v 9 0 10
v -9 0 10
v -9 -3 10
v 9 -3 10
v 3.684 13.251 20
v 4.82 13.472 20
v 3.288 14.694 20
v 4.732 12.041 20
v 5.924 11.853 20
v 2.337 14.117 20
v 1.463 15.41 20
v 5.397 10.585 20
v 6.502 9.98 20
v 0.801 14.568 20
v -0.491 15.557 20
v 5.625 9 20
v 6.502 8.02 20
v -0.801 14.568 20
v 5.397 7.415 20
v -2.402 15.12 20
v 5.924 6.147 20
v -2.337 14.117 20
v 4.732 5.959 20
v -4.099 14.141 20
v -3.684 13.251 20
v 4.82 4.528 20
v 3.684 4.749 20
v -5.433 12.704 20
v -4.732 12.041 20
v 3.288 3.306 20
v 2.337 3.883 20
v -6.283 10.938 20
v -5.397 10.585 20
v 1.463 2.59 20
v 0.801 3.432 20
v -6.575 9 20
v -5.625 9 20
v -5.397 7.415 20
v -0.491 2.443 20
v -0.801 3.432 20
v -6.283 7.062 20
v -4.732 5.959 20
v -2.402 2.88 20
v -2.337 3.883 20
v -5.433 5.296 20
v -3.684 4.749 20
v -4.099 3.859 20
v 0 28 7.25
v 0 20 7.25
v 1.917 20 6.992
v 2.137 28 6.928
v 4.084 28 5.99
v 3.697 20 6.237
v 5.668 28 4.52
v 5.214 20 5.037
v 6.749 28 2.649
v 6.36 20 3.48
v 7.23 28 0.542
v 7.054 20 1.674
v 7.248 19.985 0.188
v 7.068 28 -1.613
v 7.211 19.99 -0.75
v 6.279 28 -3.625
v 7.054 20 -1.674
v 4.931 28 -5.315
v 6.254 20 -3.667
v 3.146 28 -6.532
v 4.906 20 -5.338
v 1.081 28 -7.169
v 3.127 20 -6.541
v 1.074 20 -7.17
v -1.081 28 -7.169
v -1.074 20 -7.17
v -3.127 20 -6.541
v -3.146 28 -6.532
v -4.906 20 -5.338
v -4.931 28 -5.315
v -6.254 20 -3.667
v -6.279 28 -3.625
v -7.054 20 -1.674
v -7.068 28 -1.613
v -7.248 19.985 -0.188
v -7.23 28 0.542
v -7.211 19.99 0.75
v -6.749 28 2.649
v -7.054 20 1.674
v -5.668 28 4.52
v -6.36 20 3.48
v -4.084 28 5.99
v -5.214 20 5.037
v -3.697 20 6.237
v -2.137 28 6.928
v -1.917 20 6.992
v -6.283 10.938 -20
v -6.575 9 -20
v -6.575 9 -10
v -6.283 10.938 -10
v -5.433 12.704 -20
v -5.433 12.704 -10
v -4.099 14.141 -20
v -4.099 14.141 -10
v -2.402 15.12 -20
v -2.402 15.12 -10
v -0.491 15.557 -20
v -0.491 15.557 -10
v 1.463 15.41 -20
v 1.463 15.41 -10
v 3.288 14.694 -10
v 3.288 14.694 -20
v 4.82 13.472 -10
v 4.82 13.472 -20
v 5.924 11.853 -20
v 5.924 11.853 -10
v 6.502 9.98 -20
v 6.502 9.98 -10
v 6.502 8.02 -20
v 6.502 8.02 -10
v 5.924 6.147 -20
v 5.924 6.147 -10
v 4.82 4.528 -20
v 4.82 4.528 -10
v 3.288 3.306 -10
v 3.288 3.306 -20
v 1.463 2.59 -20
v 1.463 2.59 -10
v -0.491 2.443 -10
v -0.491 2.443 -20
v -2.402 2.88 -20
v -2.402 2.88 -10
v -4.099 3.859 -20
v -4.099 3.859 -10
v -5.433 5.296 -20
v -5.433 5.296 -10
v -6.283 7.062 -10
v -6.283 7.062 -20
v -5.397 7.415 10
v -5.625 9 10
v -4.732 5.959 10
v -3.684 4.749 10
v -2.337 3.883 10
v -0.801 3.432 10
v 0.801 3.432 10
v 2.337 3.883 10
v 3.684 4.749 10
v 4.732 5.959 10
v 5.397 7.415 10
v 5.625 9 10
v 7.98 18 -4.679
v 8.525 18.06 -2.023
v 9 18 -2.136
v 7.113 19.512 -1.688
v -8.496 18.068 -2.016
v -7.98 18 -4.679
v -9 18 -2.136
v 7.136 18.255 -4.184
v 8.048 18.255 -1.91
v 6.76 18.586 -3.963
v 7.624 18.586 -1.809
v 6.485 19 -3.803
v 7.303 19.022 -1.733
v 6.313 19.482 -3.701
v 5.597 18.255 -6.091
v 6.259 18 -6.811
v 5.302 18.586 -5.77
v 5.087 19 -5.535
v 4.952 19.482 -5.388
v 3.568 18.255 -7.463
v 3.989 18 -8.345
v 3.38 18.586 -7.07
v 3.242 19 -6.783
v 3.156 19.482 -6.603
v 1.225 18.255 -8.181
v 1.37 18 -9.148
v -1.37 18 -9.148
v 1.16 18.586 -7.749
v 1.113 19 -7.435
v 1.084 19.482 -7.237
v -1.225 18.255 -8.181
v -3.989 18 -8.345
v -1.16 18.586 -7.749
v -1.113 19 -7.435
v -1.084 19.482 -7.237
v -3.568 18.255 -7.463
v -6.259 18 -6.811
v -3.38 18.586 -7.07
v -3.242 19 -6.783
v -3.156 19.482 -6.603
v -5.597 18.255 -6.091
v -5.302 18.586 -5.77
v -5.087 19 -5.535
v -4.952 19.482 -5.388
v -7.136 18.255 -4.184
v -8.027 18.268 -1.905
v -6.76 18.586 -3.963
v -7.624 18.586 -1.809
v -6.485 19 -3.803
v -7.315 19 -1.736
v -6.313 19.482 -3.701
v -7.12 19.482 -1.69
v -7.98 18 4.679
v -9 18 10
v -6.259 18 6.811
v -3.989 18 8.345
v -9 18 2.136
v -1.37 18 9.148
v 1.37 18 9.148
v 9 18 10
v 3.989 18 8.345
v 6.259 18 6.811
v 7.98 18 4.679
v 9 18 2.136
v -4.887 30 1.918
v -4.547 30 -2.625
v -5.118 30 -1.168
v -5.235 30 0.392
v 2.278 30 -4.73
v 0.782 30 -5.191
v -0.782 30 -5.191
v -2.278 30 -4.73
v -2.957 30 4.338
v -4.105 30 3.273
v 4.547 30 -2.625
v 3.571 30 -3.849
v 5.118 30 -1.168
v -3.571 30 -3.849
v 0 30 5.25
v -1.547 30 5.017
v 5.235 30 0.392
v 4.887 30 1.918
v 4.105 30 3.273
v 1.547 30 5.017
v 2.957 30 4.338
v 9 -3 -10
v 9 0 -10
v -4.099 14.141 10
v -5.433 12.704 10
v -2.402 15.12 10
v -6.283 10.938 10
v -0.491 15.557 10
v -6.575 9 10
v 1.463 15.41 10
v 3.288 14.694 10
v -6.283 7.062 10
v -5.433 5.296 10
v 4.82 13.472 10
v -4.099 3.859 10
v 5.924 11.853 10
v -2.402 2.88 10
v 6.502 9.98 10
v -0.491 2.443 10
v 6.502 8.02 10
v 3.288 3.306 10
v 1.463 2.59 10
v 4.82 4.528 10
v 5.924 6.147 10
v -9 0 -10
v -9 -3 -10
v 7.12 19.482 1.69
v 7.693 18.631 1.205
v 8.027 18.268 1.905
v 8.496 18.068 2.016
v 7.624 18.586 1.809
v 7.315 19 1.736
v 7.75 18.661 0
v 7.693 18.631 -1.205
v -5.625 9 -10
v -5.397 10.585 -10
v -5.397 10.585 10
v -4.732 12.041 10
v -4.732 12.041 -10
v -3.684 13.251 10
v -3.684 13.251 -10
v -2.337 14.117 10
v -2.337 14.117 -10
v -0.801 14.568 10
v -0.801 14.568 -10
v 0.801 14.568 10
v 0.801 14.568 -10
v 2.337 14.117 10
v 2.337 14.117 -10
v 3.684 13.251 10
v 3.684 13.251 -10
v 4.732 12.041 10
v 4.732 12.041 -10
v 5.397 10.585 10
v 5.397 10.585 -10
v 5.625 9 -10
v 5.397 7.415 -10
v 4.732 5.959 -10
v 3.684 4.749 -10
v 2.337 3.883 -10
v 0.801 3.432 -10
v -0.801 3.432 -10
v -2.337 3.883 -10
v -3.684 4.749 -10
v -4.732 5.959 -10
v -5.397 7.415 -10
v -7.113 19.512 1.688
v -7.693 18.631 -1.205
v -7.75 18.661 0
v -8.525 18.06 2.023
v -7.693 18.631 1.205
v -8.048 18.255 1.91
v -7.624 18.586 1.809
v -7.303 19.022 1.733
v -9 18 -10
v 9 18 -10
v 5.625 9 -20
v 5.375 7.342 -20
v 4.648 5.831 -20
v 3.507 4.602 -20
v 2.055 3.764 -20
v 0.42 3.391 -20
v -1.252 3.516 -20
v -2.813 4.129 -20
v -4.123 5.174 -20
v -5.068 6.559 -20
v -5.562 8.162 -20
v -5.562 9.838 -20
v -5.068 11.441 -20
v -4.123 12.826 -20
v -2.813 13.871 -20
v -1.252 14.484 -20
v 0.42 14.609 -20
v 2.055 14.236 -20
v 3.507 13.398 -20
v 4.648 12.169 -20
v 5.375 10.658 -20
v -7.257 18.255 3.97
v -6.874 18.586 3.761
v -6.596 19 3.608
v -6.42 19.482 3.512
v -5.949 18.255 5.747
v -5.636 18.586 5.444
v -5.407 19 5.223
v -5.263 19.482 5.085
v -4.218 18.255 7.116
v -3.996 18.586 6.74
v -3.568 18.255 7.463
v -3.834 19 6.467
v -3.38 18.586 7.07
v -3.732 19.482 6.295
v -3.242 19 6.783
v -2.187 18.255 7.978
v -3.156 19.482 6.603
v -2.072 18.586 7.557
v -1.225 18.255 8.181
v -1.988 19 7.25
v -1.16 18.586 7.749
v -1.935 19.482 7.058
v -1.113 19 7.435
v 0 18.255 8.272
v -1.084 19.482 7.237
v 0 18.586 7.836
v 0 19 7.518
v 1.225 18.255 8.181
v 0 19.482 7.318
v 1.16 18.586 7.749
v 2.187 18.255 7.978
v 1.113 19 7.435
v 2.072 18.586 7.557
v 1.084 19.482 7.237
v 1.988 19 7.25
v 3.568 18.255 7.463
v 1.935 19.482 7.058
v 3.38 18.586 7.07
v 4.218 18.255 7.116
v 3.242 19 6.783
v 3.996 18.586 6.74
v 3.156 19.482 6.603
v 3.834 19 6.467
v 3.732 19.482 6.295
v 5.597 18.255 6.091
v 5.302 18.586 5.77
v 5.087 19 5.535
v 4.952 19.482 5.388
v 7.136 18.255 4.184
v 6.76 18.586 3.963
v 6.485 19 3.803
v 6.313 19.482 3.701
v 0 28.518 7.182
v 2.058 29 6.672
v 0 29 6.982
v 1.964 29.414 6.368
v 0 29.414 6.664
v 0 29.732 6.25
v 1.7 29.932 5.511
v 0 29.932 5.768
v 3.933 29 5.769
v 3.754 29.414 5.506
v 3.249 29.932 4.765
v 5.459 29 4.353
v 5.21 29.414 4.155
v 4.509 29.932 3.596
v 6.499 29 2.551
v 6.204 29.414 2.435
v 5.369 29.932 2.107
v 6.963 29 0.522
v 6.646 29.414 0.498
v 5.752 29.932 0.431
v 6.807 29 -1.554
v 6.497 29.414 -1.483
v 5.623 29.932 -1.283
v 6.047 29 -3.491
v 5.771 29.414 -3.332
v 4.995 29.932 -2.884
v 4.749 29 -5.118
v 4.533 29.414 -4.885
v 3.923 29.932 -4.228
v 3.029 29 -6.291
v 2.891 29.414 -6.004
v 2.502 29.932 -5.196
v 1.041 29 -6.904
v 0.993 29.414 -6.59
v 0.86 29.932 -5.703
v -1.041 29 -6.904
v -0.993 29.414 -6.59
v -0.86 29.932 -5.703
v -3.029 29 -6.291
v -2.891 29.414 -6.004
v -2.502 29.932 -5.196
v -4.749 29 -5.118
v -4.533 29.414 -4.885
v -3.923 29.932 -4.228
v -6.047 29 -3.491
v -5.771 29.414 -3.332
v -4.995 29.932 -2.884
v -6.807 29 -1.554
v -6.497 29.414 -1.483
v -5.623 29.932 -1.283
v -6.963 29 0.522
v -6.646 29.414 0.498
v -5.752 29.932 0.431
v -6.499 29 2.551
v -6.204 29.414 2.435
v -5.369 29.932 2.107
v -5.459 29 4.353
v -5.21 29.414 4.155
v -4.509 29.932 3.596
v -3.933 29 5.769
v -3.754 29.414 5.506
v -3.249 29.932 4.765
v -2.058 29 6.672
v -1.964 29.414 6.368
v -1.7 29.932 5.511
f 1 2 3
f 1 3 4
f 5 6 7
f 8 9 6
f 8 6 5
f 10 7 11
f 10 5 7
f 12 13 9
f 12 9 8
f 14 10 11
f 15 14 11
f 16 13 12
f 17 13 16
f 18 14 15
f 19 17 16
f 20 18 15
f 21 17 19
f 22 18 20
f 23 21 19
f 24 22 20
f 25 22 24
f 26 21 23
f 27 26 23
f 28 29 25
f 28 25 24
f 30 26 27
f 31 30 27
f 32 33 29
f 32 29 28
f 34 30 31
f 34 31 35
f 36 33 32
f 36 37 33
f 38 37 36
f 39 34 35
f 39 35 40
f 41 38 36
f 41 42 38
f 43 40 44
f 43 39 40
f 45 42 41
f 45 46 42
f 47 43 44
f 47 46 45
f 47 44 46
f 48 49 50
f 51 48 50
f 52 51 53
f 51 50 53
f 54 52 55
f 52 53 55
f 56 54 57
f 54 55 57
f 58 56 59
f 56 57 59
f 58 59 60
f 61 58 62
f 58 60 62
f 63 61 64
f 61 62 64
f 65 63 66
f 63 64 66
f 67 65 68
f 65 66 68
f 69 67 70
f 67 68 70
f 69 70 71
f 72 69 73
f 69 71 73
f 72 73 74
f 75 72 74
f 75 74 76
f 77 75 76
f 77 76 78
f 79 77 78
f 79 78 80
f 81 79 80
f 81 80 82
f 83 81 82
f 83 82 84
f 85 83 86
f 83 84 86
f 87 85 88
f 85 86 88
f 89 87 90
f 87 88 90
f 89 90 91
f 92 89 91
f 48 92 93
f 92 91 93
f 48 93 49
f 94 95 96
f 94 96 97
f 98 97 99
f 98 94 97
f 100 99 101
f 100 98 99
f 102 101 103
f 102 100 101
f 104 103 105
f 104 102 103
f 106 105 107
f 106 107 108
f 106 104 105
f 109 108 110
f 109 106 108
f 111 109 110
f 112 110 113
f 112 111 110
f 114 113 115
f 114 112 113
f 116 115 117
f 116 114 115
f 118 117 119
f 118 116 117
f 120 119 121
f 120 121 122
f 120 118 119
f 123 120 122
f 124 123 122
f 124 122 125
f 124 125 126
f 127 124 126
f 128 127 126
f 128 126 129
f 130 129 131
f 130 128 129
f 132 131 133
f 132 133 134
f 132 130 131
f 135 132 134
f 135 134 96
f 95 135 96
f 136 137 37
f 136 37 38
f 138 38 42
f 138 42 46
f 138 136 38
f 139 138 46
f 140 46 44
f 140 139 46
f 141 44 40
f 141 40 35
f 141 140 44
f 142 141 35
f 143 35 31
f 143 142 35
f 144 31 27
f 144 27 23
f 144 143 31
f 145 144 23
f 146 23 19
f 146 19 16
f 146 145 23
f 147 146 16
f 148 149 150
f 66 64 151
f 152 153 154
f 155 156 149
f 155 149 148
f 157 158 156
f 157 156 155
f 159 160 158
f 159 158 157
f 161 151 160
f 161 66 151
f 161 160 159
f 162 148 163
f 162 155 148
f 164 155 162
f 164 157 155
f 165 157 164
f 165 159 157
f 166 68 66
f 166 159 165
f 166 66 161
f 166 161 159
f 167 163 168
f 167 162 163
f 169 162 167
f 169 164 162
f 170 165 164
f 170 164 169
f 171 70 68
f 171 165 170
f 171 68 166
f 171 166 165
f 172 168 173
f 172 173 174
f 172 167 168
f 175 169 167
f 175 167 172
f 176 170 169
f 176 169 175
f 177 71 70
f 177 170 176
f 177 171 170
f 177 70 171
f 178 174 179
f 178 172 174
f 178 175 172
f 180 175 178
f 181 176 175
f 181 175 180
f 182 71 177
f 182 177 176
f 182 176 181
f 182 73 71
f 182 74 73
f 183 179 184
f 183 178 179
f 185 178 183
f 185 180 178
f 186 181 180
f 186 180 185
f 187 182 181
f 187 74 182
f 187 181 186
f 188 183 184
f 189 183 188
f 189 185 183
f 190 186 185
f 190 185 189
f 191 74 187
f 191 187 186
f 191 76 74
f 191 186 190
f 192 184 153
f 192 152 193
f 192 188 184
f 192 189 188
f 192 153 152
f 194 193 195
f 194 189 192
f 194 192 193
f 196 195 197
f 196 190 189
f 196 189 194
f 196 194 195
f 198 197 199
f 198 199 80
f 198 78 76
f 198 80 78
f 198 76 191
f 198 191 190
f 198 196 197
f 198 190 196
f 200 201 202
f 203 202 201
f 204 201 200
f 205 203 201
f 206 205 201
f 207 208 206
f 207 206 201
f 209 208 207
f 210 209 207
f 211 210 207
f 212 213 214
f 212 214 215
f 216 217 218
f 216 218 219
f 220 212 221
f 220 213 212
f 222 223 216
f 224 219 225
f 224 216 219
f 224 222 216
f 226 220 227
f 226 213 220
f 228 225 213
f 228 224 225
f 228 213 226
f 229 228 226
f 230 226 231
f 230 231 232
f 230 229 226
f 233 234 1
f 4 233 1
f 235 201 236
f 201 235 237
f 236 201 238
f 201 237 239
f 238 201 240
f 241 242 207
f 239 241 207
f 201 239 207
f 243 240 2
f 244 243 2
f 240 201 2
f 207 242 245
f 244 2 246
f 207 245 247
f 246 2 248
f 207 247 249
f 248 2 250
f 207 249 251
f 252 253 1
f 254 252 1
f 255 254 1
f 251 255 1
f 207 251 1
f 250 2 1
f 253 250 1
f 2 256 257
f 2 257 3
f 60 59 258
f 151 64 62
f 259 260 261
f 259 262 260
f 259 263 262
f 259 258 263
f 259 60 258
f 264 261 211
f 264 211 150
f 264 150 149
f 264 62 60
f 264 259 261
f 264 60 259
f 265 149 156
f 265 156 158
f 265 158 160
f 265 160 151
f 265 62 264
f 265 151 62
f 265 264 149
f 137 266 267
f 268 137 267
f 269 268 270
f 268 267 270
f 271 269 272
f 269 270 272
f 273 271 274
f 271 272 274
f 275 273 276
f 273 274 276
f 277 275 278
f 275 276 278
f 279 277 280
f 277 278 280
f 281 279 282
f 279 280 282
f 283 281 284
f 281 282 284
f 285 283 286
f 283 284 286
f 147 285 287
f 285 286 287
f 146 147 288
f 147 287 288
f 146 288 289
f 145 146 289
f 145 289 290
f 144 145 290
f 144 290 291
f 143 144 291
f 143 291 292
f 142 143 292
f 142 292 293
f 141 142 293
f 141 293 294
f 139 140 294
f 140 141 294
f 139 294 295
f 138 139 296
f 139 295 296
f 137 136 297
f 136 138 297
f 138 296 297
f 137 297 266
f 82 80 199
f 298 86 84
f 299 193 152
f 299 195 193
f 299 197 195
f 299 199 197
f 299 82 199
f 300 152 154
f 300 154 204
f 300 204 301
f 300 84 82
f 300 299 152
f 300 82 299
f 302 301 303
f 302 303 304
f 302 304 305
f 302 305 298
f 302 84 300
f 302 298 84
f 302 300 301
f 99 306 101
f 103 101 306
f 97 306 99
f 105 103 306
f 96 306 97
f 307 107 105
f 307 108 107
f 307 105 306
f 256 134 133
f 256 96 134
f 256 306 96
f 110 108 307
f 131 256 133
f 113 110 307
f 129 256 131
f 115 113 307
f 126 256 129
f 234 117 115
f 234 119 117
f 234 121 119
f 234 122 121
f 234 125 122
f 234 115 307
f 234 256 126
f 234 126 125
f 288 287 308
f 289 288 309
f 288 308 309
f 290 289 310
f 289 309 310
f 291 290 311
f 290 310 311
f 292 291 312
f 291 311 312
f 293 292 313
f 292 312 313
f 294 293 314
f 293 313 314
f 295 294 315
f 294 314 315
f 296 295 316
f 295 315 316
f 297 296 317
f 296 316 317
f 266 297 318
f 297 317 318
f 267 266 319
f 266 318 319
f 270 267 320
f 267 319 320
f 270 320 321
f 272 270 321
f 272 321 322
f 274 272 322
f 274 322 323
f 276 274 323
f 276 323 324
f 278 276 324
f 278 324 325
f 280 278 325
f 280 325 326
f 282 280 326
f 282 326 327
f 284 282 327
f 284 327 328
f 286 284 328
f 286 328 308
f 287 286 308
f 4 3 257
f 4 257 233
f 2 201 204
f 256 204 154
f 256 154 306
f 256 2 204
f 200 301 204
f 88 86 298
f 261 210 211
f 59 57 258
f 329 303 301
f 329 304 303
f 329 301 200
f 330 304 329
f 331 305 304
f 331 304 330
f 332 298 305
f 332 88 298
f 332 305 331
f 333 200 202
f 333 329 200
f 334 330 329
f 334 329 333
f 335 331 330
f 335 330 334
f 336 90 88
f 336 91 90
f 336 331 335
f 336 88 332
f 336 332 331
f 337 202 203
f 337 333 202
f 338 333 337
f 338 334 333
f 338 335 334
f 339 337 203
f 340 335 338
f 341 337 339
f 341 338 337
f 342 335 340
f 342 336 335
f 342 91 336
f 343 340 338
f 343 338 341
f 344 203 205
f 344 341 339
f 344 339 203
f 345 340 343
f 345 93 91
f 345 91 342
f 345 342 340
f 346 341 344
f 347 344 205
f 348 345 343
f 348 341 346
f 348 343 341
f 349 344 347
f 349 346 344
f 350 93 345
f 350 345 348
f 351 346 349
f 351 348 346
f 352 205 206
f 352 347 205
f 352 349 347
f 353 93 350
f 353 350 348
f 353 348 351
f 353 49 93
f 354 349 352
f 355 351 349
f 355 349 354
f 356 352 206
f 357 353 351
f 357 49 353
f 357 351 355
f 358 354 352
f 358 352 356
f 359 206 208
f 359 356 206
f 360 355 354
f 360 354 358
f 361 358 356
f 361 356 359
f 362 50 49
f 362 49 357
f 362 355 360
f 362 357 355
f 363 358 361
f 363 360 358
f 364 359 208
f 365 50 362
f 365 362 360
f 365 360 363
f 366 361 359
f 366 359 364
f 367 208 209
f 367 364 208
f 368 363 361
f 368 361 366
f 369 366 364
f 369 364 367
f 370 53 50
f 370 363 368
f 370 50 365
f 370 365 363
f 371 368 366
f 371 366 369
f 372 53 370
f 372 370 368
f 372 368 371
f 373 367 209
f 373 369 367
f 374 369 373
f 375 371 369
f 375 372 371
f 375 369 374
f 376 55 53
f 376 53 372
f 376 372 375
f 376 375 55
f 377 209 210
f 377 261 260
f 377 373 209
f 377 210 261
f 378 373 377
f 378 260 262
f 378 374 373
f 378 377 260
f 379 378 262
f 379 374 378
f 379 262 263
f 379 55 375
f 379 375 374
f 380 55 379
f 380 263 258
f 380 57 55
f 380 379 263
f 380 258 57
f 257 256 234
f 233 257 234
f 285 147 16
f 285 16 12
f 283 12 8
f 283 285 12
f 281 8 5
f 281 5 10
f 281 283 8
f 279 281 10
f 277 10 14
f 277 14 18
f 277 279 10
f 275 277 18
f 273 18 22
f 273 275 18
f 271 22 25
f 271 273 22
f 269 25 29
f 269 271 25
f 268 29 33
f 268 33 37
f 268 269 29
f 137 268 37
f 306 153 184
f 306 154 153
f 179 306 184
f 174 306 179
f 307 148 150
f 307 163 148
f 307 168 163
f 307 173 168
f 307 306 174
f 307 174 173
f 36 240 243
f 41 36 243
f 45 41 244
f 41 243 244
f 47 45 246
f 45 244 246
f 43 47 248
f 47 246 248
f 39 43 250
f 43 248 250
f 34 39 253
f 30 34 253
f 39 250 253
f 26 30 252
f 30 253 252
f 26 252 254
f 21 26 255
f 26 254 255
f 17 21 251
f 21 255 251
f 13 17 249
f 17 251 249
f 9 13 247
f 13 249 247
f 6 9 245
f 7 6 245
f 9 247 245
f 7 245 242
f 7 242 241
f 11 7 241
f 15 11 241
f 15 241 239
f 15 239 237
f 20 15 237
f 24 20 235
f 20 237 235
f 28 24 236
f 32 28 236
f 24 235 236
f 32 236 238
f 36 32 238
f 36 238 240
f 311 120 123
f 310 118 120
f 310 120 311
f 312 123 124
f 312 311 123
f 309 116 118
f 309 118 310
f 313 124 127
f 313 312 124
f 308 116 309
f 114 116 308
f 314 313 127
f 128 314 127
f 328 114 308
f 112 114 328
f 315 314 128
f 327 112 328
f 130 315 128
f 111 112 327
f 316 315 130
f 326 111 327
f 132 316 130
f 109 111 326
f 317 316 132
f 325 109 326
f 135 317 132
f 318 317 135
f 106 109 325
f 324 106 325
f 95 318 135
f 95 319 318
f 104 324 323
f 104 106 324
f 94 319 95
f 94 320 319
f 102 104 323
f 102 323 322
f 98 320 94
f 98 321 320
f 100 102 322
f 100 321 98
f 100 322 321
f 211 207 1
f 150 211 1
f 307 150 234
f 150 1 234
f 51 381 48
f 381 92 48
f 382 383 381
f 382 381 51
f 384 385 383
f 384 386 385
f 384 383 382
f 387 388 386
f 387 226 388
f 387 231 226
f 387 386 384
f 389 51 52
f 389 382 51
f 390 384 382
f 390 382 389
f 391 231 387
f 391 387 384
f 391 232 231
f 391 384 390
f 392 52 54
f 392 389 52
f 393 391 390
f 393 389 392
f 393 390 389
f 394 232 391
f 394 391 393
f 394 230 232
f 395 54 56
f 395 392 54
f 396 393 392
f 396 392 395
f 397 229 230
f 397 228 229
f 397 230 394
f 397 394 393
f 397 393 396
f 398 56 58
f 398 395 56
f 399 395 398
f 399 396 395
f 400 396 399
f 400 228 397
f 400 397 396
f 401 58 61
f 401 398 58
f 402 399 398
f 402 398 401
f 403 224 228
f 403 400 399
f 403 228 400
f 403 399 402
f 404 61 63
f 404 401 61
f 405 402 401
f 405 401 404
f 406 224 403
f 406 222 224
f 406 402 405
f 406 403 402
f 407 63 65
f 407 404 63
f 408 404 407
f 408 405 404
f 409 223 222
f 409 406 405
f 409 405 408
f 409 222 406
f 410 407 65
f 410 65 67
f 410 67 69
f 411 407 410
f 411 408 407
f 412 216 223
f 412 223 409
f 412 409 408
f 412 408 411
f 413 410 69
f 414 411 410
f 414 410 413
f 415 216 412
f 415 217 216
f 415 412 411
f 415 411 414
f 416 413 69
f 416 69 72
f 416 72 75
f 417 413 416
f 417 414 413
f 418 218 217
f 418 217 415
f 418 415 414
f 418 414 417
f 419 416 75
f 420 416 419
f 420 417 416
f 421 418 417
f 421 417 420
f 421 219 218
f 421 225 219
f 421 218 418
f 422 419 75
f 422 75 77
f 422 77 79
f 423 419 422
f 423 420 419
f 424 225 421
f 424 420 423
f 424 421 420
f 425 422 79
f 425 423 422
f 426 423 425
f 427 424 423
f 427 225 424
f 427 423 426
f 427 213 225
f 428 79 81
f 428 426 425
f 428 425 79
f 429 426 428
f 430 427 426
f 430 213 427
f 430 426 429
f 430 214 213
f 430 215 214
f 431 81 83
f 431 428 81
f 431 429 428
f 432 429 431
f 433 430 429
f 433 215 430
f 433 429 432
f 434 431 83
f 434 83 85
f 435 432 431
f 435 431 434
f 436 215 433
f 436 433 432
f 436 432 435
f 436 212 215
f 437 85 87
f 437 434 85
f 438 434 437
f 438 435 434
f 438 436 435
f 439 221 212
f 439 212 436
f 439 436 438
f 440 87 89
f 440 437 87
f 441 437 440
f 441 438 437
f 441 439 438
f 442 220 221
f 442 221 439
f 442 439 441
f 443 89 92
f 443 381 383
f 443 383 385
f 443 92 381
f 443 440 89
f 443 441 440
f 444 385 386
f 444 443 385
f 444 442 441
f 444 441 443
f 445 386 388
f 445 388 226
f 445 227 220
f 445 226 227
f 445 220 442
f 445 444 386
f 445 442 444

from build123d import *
from build123d.topology import SkipClean

# Parameters (mm, degrees)
SKETCH1_W           = 18
SKETCH1_H           = 20
BOSS_EXTRUDE1_DEPTH = 18
SKETCH6_R           = 7.25
BOSS_EXTRUDE4_DEPTH = 12
FILLET1_R           = 2
SKETCH2_R           = 6.575
SKETCH2_R_2         = 5.625
BOSS_EXTRUDE5_DEPTH = 10
BOSS_EXTRUDE6_START = 10
SKETCH3_R           = 6.575
SKETCH3_R_2         = 5.625
BOSS_EXTRUDE6_DEPTH = 10
SKETCH7_R           = 5.625
CUT_EXTRUDE2_DEPTH  = 41
SKETCH8_W           = 18
SKETCH8_H           = 20
BOSS_EXTRUDE7_DEPTH = 3


with BuildPart() as part:
    # Sketch1 → Boss-Extrude1 (new body)
    with BuildSketch(Plane(origin=(0, 0, 0), x_dir=(1, 0, 0), z_dir=(0, 1, 0))):
        Rectangle(SKETCH1_W, SKETCH1_H)
    extrude(amount=BOSS_EXTRUDE1_DEPTH)

    # Sketch6 → Boss-Extrude4 (add)
    with BuildSketch(Plane(origin=(0, 18, 0), x_dir=(1, 0, 0), z_dir=(0, 1, 0))):
        with Locations(Location((0, 0, 0), (0, 0, 270))):
            Circle(SKETCH6_R)
    extrude(amount=BOSS_EXTRUDE4_DEPTH)

    # Fillet1
    fillet1_edges = [part.edges().sort_by_distance(p)[0] for p in [
        (0, 18, -7.25),
        (0, 30, -7.25),
    ]]
    fillet(fillet1_edges, radius=FILLET1_R)

    # Sketch2 → Boss-Extrude5 (add)
    with BuildSketch(Plane.XY.offset(10)):
        with Locations(Location((0, 9, 0), (0, 0, 180))):
            Circle(SKETCH2_R)
        with Locations((0, 9)):
            Circle(SKETCH2_R_2, mode=Mode.SUBTRACT)
    extrude(amount=BOSS_EXTRUDE5_DEPTH)

    # Sketch3 → Boss-Extrude6 (add)
    with BuildSketch(Plane(origin=(0, 0, -10), x_dir=(-1, 0, 0), z_dir=(0, 0, -1)).offset(BOSS_EXTRUDE6_START)):
        with Locations((0, 9)):
            Circle(SKETCH3_R)
        with Locations(Location((0, 9, 0), (0, 0, 180))):
            Circle(SKETCH3_R_2, mode=Mode.SUBTRACT)
    extrude(amount=-BOSS_EXTRUDE6_DEPTH)

    # Sketch7 → Cut-Extrude2 (cut)
    with SkipClean():  # the faces are left unmerged after this step: merging them gives an invalid solid
        with BuildSketch(Plane(origin=(0, 0, -10), x_dir=(-1, 0, 0), z_dir=(0, 0, -1))):
            with Locations((0, 9)):
                Circle(SKETCH7_R)
        extrude(amount=-CUT_EXTRUDE2_DEPTH, mode=Mode.SUBTRACT)

    # Sketch8 → Boss-Extrude7 (add)
    with SkipClean():  # the faces are left unmerged after this step: merging them gives an invalid solid
        with BuildSketch(Plane.XZ):
            Rectangle(SKETCH8_W, SKETCH8_H)
        extrude(amount=BOSS_EXTRUDE7_DEPTH)


solid = part.part
